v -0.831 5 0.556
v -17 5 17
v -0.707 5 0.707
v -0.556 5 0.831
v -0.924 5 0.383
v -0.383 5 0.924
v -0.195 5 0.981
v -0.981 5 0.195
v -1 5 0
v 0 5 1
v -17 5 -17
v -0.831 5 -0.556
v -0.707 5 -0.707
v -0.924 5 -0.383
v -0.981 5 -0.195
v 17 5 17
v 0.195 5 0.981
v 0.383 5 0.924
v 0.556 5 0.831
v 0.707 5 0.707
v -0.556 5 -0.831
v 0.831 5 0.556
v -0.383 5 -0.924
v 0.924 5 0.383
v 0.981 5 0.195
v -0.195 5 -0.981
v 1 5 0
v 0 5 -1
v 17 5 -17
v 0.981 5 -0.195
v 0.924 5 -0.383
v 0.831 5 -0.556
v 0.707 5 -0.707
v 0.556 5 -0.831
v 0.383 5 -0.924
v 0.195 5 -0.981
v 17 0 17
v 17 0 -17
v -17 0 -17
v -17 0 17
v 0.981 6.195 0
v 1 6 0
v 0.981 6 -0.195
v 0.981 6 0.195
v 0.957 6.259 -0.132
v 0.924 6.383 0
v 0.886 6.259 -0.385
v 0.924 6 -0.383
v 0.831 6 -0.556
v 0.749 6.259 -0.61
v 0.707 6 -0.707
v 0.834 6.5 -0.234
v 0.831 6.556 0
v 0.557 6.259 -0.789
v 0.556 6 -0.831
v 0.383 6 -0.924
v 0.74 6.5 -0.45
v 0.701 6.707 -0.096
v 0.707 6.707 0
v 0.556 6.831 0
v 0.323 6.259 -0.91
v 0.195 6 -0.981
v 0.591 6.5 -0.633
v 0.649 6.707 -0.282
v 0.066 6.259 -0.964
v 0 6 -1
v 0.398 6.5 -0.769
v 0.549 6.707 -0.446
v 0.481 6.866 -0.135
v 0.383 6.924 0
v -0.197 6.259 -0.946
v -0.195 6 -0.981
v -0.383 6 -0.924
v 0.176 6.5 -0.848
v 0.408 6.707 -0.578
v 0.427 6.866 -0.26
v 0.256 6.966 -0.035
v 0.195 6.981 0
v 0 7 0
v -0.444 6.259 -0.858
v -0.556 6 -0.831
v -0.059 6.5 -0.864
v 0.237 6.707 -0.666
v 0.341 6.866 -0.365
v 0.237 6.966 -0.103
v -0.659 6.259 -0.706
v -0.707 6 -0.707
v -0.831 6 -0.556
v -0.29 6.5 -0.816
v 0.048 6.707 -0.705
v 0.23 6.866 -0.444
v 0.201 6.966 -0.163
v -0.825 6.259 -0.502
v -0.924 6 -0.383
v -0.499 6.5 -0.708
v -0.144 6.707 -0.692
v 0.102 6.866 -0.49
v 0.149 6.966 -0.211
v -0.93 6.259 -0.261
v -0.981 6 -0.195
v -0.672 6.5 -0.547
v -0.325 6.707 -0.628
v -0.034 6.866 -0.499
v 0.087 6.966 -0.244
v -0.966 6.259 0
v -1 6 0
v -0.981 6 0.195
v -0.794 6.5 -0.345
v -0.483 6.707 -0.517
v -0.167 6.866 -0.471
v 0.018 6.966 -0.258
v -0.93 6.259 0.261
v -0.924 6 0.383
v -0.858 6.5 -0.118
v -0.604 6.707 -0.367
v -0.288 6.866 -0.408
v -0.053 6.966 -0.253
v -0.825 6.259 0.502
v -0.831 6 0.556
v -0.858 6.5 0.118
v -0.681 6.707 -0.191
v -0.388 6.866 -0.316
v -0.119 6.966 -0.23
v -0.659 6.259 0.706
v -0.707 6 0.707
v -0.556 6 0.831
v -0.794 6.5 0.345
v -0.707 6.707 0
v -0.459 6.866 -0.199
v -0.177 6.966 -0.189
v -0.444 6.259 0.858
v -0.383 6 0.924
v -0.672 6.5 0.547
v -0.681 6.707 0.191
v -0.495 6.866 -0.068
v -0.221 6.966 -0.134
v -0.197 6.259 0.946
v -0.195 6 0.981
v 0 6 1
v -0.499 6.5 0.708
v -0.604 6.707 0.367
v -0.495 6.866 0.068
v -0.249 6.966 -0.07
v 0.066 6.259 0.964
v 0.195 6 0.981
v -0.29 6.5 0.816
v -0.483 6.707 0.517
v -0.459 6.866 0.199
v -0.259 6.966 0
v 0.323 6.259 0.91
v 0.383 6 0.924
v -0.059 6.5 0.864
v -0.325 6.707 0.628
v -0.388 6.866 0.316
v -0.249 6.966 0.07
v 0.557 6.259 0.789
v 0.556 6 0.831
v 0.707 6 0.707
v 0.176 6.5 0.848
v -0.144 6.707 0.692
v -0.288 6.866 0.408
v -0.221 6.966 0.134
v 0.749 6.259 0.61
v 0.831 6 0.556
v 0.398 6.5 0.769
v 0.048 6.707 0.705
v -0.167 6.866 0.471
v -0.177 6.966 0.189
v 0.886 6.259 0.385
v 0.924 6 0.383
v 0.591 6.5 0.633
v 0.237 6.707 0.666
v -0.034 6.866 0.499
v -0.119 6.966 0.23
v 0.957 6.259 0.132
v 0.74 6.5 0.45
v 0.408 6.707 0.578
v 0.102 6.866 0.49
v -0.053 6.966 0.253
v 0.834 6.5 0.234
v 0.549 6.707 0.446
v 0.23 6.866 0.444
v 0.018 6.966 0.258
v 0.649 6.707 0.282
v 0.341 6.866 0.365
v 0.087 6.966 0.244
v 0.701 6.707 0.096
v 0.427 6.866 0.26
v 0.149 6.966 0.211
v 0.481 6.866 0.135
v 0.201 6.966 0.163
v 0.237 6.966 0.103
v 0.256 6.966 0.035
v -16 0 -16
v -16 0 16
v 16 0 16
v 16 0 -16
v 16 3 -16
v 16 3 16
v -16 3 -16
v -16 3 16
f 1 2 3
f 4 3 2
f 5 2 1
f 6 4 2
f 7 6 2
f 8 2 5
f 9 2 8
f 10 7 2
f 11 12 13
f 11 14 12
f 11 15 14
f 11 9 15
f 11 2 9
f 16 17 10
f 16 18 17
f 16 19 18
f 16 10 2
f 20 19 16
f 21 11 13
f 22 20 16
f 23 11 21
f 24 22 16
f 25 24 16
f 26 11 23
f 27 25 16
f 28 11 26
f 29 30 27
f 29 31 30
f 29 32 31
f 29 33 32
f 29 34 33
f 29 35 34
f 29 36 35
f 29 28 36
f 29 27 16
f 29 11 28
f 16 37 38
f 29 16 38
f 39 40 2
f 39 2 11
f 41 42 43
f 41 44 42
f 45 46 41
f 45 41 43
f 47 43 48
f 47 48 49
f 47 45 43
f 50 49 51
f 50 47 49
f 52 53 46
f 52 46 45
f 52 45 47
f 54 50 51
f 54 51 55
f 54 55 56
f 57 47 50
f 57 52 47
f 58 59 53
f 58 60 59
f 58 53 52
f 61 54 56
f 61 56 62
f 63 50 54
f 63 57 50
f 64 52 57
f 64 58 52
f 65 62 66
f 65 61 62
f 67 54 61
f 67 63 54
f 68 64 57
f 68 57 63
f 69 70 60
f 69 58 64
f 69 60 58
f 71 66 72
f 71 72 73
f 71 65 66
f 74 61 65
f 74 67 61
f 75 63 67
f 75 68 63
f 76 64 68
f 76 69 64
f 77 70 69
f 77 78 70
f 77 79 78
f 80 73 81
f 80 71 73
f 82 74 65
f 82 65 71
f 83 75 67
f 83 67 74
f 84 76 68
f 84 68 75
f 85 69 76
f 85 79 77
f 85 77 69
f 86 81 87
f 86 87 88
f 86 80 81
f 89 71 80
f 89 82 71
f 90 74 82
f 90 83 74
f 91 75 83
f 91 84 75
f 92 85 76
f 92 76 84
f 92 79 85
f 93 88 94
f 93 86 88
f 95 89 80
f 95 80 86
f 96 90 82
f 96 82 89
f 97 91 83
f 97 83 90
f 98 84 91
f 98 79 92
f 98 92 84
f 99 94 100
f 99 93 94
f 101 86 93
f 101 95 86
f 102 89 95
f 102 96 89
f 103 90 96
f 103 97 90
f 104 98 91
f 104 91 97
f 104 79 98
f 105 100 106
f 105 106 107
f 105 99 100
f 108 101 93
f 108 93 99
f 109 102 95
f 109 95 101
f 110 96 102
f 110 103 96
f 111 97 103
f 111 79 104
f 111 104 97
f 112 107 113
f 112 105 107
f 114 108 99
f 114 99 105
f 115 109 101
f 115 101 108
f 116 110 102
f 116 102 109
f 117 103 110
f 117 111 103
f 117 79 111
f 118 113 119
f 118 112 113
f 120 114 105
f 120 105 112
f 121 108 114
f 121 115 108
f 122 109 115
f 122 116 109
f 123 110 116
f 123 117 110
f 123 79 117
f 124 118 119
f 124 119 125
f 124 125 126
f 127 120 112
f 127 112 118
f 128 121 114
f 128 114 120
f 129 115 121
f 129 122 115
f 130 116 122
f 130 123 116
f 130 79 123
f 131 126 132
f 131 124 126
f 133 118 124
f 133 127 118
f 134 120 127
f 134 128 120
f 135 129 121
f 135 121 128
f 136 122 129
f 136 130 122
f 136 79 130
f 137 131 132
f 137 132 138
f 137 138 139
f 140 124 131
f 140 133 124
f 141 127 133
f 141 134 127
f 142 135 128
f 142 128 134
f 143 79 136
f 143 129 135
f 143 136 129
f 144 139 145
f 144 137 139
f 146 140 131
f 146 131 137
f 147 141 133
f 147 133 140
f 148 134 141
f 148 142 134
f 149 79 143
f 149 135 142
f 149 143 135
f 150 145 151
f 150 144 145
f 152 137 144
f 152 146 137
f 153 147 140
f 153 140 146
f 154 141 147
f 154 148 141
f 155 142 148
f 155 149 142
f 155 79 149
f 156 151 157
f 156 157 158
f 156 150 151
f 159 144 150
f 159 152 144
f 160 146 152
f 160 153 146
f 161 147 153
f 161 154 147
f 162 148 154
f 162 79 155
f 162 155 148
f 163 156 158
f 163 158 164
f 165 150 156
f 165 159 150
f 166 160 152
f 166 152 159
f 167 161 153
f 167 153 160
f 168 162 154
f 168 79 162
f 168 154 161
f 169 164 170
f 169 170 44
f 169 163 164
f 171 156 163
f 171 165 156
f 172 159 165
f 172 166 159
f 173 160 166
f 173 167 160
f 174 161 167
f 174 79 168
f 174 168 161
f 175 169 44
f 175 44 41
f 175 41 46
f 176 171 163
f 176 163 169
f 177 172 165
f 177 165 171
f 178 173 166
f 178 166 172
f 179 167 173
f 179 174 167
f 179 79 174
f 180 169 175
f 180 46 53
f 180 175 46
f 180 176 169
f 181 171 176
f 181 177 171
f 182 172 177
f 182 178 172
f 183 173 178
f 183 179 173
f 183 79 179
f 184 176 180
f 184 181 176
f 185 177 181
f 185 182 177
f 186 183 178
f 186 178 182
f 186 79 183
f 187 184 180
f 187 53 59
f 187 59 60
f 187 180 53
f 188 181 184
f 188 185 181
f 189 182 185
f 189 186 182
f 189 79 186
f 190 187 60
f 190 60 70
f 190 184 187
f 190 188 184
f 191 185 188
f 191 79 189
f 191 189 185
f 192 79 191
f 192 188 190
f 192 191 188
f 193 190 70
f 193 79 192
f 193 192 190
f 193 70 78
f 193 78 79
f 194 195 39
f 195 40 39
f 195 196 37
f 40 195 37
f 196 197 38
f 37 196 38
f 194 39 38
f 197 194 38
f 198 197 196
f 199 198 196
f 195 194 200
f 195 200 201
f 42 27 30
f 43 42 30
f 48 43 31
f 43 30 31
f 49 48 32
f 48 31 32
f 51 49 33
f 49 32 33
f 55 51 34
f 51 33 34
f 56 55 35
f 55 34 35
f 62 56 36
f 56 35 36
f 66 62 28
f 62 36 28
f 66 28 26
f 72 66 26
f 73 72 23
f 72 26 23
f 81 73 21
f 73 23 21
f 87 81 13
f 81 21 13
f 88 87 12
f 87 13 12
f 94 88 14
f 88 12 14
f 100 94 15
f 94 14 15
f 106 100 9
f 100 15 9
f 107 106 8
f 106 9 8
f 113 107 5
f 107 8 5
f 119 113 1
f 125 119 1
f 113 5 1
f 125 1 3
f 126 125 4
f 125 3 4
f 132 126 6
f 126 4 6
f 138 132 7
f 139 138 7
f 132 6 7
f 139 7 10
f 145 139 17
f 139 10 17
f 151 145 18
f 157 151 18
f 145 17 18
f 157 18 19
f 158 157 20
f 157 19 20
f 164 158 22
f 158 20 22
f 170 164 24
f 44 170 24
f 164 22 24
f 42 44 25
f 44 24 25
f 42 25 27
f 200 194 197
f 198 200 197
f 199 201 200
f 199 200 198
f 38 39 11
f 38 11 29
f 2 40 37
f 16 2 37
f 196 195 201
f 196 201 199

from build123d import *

# Parameters (mm, degrees)
SKETCH2_W           = 34
SKETCH2_H           = 34
BOSS_EXTRUDE1_DEPTH = 5
SKETCH3_W           = 32
SKETCH3_H           = 32
CUT_EXTRUDE1_DEPTH  = 3
SKETCH4_R           = 1
BOSS_EXTRUDE2_DEPTH = 2
FILLET1_R           = 1


with BuildPart() as part:
    # Sketch2 → Boss-Extrude1 (new body)
    with BuildSketch(Plane(origin=(0, 0, 0), x_dir=(1, 0, 0), z_dir=(0, 1, 0))):
        Rectangle(SKETCH2_W, SKETCH2_H)
    extrude(amount=BOSS_EXTRUDE1_DEPTH)

    # Sketch3 → Cut-Extrude1 (cut)
    with BuildSketch(Plane.XZ):
        Rectangle(SKETCH3_W, SKETCH3_H)
    extrude(amount=-CUT_EXTRUDE1_DEPTH, mode=Mode.SUBTRACT)

    # Sketch4 → Boss-Extrude2 (add)
    with BuildSketch(Plane(origin=(0, 5, 0), x_dir=(1, 0, 0), z_dir=(0, 1, 0))):
        Circle(SKETCH4_R)
    extrude(amount=BOSS_EXTRUDE2_DEPTH)

    # Fillet1
    fillet1_edges = [part.edges().sort_by_distance(p)[0] for p in [
        (-1, 7, 0),
    ]]
    fillet(fillet1_edges, radius=FILLET1_R)


solid = part.part
